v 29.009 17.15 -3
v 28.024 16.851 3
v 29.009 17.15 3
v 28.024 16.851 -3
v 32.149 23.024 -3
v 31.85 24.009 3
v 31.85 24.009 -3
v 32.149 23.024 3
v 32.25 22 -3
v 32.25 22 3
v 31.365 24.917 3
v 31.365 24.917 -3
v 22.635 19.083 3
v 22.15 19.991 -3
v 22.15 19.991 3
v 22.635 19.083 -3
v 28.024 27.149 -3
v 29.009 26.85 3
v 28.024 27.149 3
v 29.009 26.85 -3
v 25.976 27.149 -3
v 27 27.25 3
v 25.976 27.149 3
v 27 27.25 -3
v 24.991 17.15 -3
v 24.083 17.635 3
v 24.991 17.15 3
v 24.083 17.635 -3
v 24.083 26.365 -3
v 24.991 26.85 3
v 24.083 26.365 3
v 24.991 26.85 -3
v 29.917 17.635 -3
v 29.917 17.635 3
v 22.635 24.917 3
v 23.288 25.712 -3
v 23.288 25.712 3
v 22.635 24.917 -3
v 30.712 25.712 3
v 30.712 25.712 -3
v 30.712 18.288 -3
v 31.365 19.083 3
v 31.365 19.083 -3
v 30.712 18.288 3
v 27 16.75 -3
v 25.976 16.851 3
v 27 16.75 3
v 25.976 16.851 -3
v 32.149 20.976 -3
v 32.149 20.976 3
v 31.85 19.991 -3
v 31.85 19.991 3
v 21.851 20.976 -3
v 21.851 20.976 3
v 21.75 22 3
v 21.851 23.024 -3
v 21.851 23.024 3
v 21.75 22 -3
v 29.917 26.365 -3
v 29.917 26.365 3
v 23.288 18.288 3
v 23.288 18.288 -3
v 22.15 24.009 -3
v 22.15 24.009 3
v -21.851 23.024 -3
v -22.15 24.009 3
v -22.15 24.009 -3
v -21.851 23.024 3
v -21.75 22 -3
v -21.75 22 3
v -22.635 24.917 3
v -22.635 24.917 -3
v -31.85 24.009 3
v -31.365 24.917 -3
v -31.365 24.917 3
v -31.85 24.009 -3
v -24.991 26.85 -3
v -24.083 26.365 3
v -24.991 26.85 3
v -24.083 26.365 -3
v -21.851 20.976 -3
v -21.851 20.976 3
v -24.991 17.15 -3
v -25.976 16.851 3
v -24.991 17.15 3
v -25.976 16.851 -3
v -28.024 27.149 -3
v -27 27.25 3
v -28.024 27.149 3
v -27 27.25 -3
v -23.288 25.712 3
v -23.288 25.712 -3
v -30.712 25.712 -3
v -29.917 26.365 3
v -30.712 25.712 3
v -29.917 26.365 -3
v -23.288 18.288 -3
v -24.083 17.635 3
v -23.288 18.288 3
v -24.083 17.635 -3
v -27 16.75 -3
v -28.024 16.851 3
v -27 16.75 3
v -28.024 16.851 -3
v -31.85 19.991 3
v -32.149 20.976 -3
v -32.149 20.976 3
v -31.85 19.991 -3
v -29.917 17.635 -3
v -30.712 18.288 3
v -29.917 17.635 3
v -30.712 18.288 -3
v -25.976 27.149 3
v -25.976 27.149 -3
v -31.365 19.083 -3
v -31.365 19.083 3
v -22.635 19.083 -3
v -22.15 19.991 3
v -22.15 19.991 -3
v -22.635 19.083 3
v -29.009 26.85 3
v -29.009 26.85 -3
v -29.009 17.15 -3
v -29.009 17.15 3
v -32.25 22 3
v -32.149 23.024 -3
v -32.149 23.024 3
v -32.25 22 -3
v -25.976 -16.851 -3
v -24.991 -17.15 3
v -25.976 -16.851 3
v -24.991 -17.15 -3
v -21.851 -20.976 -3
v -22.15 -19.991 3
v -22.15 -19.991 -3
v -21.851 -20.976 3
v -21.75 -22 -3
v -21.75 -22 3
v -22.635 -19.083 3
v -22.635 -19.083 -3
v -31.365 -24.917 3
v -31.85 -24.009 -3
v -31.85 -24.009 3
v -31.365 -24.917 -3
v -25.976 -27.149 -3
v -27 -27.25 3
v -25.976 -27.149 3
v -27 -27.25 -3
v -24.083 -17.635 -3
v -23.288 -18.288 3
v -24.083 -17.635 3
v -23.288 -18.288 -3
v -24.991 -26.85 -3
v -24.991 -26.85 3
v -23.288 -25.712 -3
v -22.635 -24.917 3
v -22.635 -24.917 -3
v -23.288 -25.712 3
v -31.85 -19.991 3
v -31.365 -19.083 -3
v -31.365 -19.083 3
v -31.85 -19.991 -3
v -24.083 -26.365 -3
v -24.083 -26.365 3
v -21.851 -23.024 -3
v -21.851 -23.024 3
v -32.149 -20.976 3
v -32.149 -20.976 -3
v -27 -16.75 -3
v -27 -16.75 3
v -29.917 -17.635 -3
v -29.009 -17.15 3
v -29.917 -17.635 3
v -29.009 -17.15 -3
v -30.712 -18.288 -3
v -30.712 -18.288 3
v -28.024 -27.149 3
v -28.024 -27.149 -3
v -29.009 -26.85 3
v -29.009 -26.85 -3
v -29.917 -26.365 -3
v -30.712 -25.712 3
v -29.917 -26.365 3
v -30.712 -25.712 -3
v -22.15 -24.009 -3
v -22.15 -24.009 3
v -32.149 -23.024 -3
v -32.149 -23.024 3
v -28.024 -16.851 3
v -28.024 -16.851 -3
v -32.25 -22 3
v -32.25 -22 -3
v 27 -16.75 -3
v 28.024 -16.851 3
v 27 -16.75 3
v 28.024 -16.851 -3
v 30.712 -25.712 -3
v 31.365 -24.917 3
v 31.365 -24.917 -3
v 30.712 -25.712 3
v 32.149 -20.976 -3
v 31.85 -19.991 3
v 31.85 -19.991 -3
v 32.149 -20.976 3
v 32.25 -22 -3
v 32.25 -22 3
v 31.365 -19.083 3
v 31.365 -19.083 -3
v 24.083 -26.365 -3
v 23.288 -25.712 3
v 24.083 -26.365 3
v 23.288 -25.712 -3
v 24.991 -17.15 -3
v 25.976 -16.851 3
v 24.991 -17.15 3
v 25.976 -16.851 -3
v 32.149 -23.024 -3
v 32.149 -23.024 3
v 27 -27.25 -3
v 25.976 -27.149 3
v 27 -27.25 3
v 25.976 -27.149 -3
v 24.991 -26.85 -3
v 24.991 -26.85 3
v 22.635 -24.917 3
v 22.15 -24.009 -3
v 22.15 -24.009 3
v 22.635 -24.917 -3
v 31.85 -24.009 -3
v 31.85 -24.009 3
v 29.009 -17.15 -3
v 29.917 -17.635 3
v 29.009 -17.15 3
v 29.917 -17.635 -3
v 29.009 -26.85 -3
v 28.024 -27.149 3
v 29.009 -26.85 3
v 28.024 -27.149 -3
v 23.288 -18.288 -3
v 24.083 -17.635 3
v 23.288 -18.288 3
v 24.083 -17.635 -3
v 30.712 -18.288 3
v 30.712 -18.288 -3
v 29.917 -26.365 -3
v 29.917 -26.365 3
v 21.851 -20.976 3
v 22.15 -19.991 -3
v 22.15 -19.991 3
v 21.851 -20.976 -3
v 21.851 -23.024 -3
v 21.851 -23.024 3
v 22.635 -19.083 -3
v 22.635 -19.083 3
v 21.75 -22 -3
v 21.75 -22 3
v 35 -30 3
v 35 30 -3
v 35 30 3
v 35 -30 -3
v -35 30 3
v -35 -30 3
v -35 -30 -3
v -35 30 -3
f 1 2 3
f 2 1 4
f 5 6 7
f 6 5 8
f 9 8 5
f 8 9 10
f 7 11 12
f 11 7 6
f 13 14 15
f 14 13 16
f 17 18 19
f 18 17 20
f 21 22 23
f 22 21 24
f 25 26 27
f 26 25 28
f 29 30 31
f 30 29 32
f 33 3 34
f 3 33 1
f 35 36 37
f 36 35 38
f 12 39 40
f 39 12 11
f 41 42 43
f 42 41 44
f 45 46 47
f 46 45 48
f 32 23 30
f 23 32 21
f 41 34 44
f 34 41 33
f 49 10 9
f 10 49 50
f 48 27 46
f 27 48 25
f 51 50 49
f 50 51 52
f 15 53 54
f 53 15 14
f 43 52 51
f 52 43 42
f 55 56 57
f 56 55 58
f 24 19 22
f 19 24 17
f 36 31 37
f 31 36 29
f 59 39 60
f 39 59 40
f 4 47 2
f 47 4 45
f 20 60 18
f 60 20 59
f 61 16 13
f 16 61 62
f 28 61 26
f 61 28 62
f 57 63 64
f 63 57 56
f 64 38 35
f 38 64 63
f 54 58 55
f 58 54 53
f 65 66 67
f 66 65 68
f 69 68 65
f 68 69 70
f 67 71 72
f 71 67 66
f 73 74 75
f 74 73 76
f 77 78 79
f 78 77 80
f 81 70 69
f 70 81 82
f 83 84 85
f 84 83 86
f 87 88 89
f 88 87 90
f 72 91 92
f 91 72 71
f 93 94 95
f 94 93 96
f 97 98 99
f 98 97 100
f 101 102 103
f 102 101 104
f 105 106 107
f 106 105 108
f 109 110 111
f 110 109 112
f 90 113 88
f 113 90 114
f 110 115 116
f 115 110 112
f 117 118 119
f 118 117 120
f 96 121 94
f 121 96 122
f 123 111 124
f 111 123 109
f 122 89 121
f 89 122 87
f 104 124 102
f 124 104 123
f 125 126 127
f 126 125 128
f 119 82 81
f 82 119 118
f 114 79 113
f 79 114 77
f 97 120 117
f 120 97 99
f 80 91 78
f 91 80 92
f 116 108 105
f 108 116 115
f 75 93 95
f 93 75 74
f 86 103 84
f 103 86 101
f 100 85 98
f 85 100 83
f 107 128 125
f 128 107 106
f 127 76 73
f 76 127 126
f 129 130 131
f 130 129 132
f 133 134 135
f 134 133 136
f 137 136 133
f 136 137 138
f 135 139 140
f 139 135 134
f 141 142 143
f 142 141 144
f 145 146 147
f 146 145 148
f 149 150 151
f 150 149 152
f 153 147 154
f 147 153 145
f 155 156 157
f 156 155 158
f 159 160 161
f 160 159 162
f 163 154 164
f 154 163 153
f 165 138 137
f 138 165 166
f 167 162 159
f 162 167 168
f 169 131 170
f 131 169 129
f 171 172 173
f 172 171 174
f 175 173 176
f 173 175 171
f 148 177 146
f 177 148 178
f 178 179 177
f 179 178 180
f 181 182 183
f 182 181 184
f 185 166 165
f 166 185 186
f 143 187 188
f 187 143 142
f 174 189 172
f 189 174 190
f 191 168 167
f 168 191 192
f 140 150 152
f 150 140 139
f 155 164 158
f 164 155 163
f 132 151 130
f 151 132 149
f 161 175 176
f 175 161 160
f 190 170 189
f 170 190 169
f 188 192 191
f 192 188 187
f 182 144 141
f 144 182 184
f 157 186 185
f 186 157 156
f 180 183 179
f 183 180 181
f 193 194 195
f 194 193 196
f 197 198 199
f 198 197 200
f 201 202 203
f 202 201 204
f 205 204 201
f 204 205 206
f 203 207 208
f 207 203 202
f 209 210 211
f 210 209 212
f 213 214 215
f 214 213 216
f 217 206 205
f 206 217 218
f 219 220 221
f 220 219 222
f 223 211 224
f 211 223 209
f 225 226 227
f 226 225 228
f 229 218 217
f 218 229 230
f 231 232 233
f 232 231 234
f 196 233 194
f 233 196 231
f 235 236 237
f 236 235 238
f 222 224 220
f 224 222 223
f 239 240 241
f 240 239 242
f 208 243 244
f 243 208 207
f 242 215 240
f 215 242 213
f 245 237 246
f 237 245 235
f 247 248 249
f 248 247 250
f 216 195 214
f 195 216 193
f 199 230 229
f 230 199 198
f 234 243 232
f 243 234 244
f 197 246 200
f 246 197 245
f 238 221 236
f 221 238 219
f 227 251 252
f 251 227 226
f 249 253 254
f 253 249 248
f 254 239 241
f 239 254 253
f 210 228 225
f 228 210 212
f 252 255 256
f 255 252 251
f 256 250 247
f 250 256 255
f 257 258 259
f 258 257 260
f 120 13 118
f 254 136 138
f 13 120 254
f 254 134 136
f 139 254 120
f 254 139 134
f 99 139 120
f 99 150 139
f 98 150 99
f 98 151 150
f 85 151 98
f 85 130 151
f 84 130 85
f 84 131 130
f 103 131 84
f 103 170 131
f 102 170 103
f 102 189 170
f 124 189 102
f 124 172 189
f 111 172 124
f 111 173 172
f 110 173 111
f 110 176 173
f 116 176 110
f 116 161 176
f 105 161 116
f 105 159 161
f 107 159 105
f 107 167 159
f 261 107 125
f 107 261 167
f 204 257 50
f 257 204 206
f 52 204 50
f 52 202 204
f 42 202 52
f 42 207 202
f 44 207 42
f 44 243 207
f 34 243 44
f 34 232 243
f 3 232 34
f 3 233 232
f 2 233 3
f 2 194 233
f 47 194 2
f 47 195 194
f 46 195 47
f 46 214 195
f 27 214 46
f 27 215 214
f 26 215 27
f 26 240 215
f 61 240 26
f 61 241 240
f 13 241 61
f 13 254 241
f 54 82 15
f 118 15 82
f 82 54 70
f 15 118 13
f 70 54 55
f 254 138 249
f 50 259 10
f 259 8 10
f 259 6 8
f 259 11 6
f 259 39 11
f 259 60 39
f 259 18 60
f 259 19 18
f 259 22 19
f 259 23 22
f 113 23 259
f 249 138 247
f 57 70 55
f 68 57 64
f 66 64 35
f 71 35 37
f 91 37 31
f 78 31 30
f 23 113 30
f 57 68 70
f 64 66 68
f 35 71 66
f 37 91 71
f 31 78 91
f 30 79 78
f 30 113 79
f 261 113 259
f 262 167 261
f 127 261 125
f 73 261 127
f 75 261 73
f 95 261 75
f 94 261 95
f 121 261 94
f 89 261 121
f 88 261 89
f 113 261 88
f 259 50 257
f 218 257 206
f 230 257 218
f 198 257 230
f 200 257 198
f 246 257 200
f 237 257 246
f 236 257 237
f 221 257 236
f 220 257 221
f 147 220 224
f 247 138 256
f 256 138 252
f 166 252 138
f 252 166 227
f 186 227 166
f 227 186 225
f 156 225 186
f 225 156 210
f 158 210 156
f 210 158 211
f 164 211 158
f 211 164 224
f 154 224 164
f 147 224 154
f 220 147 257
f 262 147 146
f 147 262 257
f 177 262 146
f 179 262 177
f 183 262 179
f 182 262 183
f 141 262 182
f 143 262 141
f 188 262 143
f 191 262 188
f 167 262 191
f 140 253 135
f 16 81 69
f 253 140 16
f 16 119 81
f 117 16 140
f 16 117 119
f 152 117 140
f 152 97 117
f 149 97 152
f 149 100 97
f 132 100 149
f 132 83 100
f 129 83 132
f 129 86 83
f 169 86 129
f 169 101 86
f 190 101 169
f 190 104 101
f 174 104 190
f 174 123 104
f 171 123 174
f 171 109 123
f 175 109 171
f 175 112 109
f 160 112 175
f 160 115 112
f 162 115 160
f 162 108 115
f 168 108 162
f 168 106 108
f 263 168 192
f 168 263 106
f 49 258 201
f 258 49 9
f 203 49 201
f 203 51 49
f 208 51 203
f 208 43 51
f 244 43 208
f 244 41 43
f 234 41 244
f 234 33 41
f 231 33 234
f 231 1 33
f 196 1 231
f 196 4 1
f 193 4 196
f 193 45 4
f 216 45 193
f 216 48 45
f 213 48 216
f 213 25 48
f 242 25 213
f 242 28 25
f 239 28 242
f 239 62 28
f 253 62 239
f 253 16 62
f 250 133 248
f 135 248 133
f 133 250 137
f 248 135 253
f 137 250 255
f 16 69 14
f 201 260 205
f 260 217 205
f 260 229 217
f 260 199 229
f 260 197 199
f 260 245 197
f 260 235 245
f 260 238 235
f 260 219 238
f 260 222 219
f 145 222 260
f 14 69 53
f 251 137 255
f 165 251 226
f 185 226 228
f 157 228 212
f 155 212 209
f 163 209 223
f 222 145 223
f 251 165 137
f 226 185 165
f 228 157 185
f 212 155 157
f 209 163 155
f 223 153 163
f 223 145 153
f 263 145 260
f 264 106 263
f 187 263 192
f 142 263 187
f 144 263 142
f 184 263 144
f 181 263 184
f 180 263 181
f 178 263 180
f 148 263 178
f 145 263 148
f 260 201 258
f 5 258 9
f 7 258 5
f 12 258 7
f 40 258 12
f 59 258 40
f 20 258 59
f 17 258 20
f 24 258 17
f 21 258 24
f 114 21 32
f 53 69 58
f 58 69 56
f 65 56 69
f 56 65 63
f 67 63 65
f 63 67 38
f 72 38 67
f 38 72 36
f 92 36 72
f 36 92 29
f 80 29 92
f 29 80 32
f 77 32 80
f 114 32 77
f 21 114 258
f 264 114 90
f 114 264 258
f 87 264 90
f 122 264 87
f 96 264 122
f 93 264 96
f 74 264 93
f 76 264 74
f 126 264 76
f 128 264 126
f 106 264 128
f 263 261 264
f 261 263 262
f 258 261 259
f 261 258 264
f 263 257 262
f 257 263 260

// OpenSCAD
$fn = 32;

// ----------------------------------------------------------------------
// Corner plate 70 x 60 x 6
// 4 holes, centres taken from the edge offset
// ----------------------------------------------------------------------

// --- parameters (mm) ---
plate = [70, 60, 6];  // overall size (x, y, z)
seat_tol = 0.05;      // tolerance at the seating features
free_tol = 0.3;       // general tolerance on the free sizes
holes = 4;            // number of holes the drawing asks for
hole_d = 10.5;        // hole diameter
edge = 8;             // hole centre offset from the plate edge

// --- derived feature positions (mm) ---
corner_x = plate[0] / 2 - edge;  // = 27   corner hole X
corner_y = plate[1] / 2 - edge;  // = 22   corner hole Y
feature_centers = [
  [corner_x, corner_y],
  [-corner_x, corner_y],
  [-corner_x, -corner_y],
  [corner_x, -corner_y]
];   // hole centres the loop below drills

// plate outline, every hole drilled through with the same cutters
difference() {
  cube(plate, center = true);
  for (centre = feature_centers)
    translate([centre[0], centre[1], 0])
      cylinder(d = hole_d, h = plate[2] + 2, center = true);
}
